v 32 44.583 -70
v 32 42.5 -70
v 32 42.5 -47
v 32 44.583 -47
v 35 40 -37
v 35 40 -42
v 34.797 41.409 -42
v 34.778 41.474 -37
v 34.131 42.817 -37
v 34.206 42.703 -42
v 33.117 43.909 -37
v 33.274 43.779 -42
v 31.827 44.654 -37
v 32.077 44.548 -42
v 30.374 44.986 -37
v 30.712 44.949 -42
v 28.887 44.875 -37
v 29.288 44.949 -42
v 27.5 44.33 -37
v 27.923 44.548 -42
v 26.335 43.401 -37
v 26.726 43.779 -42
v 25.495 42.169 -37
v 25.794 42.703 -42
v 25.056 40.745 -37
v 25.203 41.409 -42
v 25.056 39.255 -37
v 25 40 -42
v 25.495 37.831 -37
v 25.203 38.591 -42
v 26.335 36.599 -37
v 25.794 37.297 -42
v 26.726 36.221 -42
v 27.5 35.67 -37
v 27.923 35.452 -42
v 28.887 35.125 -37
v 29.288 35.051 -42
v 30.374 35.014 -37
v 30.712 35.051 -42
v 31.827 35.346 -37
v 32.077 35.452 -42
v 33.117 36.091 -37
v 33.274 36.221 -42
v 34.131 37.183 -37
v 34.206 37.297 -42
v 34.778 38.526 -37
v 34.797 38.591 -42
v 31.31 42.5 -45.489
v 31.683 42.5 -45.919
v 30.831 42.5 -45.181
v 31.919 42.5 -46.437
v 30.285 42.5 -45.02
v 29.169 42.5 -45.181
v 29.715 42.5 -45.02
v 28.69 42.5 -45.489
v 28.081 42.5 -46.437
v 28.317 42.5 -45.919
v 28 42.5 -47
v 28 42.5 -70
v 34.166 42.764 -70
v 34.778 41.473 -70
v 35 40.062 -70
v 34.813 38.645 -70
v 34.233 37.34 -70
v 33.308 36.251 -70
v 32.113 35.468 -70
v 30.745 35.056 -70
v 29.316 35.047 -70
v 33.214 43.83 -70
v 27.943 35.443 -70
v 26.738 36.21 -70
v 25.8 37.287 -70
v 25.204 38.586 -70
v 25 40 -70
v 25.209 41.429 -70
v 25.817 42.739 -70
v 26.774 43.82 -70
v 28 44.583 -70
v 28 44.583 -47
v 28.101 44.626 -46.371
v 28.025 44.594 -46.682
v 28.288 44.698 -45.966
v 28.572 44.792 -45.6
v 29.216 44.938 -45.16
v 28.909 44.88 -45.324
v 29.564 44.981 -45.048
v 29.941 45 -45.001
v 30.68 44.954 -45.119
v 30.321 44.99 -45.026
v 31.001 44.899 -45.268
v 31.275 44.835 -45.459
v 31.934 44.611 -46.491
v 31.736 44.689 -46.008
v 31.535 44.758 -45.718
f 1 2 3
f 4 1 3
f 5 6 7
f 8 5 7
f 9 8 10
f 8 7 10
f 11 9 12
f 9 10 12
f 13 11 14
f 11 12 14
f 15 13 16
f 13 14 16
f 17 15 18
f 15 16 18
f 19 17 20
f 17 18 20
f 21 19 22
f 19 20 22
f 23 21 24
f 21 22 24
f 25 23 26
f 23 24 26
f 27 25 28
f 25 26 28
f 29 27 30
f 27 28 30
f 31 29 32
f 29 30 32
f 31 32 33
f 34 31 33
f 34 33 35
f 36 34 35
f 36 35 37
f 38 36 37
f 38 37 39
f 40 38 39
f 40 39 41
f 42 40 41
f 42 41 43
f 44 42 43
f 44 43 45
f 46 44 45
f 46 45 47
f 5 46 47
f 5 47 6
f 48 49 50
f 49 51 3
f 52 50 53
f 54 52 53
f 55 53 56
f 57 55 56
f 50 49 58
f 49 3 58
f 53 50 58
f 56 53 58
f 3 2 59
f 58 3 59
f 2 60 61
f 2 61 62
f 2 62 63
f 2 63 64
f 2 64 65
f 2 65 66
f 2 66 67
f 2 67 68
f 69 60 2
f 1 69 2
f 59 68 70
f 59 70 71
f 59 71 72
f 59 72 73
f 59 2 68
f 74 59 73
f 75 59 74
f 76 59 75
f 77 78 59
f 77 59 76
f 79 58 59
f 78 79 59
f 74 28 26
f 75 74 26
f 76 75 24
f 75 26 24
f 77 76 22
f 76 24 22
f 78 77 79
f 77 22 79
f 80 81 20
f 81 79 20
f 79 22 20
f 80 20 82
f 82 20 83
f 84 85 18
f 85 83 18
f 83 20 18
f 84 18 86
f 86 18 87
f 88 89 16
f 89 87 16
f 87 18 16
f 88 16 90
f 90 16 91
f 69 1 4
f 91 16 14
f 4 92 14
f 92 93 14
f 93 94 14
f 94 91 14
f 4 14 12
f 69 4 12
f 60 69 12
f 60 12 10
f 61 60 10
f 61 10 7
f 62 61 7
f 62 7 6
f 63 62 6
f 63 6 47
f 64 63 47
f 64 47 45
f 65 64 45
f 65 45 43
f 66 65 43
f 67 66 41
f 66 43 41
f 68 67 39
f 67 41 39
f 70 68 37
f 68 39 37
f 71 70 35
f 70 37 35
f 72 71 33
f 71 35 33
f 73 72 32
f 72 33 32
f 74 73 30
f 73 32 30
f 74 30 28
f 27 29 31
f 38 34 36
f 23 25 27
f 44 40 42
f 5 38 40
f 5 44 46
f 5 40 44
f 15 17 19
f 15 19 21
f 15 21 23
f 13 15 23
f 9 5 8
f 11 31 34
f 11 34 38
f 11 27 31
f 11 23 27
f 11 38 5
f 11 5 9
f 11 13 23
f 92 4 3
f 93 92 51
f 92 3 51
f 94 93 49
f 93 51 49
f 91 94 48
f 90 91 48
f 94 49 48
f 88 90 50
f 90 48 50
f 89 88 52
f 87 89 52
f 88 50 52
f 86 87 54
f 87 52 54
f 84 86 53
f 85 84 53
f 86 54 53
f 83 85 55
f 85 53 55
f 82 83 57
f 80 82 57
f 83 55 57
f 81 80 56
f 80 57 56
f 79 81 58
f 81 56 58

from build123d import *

# Parameters (mm, degrees)
SKETCH2_W           = 60
SKETCH2_H           = 60
BOSS_EXTRUDE1_DEPTH = 42
SKETCH3_W           = 60
SKETCH3_H           = 60
BOSS_EXTRUDE2_DEPTH = 38
FILLET1_R           = 5
FILLET2_R           = 5
FILLET3_R           = 5
SKETCH4_R           = 2.25
CUT_EXTRUDE1_DEPTH  = 10
SKETCH5_R           = 12
BOSS_EXTRUDE3_DEPTH = 4
SKETCH6_R           = 5
BOSS_EXTRUDE4_DEPTH = 28
CUT_EXTRUDE2_DEPTH  = 28
SKETCH8_W           = 83.4072332
SKETCH8_H           = 75.183984856
CUT_EXTRUDE3_DEPTH  = 84
SKETCH9_R           = 5
BOSS_EXTRUDE5_DEPTH = 5


with BuildPart() as part:
    # Sketch2 → Boss-Extrude1 (new body)
    with BuildSketch(Plane.XY):
        with Locations((30, 30)):
            Rectangle(SKETCH2_W, SKETCH2_H)
    extrude(amount=BOSS_EXTRUDE1_DEPTH)

    # Fillet1
    fillet1_edges = [part.edges().sort_by_distance(p)[0] for p in [
        (0, 60, 21),
        (60, 60, 21),
        (60, 0, 21),
        (0, 0, 21),
    ]]
    fillet(fillet1_edges, radius=FILLET1_R)

    # Fillet3
    fillet3_edges = [part.edges().sort_by_distance(p)[0] for p in [
        (30, 0, 42),
        (0, 30, 42),
        (60, 30, 42),
        (30, 60, 42),
        (58.535533906, 58.535533906, 42),
        (1.464466094, 58.535533906, 42),
        (58.535533906, 1.464466094, 42),
        (1.464466094, 1.464466094, 42),
    ]]
    fillet(fillet3_edges, radius=FILLET3_R)


with BuildPart() as body_2:
    # Sketch3 → Boss-Extrude2 (new body)
    with BuildSketch(Plane(origin=(0, 0, 0), x_dir=(-1, 0, 0), z_dir=(0, 0, -1))):
        with Locations((-30, 30)):
            Rectangle(SKETCH3_W, SKETCH3_H)
    extrude(amount=BOSS_EXTRUDE2_DEPTH)

    # Fillet2
    fillet2_edges = [body_2.edges().sort_by_distance(p)[0] for p in [
        (60, 0, -19),
        (60, 60, -19),
        (0, 60, -19),
        (0, 0, -19),
    ]]
    fillet(fillet2_edges, radius=FILLET2_R)

    # Sketch4 → Cut-Extrude1 (cut)
    with BuildSketch(Plane(origin=(0, 0, -38), x_dir=(-1, 0, 0), z_dir=(0, 0, -1))):
        with Locations((-5.251262658, 54.748737342)):
            Circle(SKETCH4_R)
        with Locations((-54.748737342, 54.748737342)):
            Circle(SKETCH4_R)
        with Locations((-54.748737342, 5.251262658)):
            Circle(SKETCH4_R)
        with Locations((-5.251262658, 5.251262658)):
            Circle(SKETCH4_R)
    extrude(amount=-CUT_EXTRUDE1_DEPTH, mode=Mode.SUBTRACT)

    # Sketch5 → Boss-Extrude3 (add)
    with BuildSketch(Plane(origin=(0, 0, -38), x_dir=(-1, 0, 0), z_dir=(0, 0, -1))):
        with Locations((-30, 40)):
            Circle(SKETCH5_R)
    extrude(amount=BOSS_EXTRUDE3_DEPTH)

    # Sketch6 → Boss-Extrude4 (add)
    with BuildSketch(Plane(origin=(0, 0, -42), x_dir=(-1, 0, 0), z_dir=(0, 0, -1))):
        with Locations((-30, 40)):
            Circle(SKETCH6_R)
    extrude(amount=BOSS_EXTRUDE4_DEPTH)

    # Sketch7 → Cut-Extrude2 (cut)
    with BuildSketch(Plane(origin=(0, 42.5, 0), x_dir=(1, 0, 0), z_dir=(0, 1, 0))):
        with BuildLine():
            Line((28, 47), (28, 70))
            Line((28, 70), (32, 70))
            Line((32, 70), (32, 47))
            ThreePointArc((32, 47), (30, 45), (28, 47))
        make_face()
    extrude(amount=CUT_EXTRUDE2_DEPTH, mode=Mode.SUBTRACT)


with BuildPart() as cut_extrude3_tool:
    # Sketch8 → Cut-Extrude3 (new body)
    with BuildSketch(Plane(origin=(0, 0, -42), x_dir=(-1, 0, 0), z_dir=(0, 0, -1))):
        with Locations((-33.52424929, 30.998537299)):
            Rectangle(SKETCH8_W, SKETCH8_H)
    extrude(amount=-CUT_EXTRUDE3_DEPTH)


with BuildPart() as part_1:
    add(part.part)

    # Cut-Extrude3: cut by cut_extrude3_tool
    add(cut_extrude3_tool.part, mode=Mode.SUBTRACT)


with BuildPart() as body_2_1:
    add(body_2.part)

    # Cut-Extrude3: cut by cut_extrude3_tool
    add(cut_extrude3_tool.part, mode=Mode.SUBTRACT)

    # Sketch9 → Boss-Extrude5 (add)
    with BuildSketch(Plane.XY.offset(-42)):
        with Locations((30, 40)):
            Circle(SKETCH9_R)
    extrude(amount=BOSS_EXTRUDE5_DEPTH)


solid = body_2_1.part
